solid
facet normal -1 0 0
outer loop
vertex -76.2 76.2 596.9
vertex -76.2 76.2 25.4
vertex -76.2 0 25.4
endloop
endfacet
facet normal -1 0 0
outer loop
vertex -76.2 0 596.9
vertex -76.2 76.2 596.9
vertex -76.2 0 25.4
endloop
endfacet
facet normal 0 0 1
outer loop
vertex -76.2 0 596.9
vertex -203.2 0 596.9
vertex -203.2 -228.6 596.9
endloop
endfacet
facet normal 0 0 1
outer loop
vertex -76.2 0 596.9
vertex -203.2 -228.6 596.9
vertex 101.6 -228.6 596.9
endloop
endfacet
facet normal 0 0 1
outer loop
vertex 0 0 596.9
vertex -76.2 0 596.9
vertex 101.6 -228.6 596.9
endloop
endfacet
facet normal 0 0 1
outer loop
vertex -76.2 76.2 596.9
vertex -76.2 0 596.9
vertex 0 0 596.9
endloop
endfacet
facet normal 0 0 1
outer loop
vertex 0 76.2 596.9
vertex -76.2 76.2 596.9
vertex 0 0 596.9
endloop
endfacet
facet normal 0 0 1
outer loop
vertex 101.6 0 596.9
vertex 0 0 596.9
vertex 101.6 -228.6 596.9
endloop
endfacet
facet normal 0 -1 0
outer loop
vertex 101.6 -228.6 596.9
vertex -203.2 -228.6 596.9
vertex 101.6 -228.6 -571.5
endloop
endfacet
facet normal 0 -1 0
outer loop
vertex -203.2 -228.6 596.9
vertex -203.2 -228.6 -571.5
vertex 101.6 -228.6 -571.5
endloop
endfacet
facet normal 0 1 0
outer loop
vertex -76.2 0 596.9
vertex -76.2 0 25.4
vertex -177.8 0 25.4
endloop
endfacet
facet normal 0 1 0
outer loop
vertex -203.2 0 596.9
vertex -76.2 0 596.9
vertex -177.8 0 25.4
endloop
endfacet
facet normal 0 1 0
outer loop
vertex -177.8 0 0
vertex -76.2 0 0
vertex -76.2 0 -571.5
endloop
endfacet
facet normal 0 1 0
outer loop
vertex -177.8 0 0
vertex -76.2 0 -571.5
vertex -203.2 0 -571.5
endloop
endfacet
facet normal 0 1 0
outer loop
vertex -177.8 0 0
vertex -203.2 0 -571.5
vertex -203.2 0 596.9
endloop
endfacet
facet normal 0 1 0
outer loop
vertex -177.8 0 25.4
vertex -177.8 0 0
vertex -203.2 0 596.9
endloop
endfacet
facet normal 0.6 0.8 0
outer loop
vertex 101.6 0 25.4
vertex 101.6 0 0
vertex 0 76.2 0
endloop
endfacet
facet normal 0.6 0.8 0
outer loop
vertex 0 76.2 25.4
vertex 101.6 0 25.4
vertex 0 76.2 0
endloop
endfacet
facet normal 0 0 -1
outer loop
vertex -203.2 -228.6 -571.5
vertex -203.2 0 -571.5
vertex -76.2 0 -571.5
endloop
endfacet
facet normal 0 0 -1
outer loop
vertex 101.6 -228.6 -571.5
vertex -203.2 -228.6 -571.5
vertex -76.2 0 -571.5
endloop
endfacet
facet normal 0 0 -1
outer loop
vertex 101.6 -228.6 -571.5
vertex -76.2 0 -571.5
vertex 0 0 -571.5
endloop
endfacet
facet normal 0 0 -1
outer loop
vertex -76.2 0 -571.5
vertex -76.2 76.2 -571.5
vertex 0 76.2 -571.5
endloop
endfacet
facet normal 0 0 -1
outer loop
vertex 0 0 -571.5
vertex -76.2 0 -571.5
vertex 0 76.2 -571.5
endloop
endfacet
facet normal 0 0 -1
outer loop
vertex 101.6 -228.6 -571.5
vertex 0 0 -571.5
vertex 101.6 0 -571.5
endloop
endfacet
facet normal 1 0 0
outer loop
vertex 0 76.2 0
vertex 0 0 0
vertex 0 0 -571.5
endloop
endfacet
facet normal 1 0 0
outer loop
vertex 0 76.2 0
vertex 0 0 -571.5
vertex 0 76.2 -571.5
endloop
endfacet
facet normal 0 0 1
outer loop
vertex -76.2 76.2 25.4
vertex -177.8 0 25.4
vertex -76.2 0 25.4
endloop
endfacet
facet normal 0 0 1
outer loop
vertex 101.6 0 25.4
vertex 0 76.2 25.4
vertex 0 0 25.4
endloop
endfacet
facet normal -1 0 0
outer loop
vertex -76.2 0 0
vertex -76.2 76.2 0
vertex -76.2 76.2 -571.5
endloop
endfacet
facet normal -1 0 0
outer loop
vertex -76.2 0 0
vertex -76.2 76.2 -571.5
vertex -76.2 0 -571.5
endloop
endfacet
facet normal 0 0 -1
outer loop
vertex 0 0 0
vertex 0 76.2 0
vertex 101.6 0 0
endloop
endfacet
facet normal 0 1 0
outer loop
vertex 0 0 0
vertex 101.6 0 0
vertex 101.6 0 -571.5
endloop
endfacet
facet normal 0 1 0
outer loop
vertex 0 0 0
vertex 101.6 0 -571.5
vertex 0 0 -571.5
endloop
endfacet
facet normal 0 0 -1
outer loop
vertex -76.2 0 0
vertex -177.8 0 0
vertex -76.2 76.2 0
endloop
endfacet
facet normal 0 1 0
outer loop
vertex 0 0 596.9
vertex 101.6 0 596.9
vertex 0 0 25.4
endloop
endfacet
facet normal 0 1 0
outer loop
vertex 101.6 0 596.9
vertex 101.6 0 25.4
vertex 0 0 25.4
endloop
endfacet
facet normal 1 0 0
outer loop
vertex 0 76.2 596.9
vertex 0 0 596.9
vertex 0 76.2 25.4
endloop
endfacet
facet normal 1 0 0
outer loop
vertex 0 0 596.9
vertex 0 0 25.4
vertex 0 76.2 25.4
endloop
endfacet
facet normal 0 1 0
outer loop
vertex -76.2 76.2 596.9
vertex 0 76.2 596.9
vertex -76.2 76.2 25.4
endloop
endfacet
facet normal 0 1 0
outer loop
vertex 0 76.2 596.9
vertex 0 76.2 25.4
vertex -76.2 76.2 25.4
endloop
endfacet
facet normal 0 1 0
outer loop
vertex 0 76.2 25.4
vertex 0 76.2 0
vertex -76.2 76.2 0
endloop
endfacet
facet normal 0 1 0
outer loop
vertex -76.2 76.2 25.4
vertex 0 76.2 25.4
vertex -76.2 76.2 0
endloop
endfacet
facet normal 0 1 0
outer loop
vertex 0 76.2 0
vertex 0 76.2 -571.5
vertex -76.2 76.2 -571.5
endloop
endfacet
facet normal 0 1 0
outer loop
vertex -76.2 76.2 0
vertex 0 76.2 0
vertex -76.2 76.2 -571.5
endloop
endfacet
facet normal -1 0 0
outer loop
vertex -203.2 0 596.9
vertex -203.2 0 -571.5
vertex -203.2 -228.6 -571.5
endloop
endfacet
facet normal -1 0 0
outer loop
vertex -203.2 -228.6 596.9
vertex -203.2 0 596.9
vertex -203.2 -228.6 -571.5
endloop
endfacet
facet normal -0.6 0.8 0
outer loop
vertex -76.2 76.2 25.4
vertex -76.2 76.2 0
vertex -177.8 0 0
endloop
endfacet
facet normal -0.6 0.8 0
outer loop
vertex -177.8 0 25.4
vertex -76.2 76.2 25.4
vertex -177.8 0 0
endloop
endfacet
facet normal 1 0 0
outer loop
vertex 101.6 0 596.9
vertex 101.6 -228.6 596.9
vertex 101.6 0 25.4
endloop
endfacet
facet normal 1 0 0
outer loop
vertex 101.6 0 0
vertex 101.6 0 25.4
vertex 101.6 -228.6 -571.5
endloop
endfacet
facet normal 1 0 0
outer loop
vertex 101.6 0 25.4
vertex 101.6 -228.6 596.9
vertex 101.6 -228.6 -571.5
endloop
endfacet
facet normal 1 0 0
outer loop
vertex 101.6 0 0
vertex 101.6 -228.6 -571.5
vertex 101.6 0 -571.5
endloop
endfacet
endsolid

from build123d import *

# Parameters (mm, degrees)
F1_DEPTH = 571.5
F2_DEPTH = 25.4
F3_DEPTH = 571.5
F4_DEPTH = 25.4


with BuildPart() as f1:
    # F0 (on Top) → F1 (new body, symmetric)
    with BuildSketch(Plane.XY):
        Polygon((-50.8, 0), (0, 0), (0, 76.2), (-76.2, 76.2), (-76.2, 0), align=None)
    extrude(amount=F1_DEPTH, both=True)

    # F0 (on Top) → F2 (join)
    with BuildSketch(Plane.XY):
        Polygon((-177.8, 0), (-76.2, 0), (-76.2, 76.2), align=None)
        Polygon((0, 76.2), (0, 0), (101.6, 0), align=None)
    extrude(amount=F2_DEPTH)

    # F0 (on Top) → F3 (join, symmetric)
    with BuildSketch(Plane.XY):
        Polygon((-76.2, -228.6), (-76.2, 0), (-177.8, 0), (-203.2, 0), (-203.2, -228.6), align=None)
        Polygon((101.6, 0), (0, 0), (-50.8, 0), (-76.2, 0), (-76.2, -228.6), (101.6, -228.6), align=None)
    extrude(amount=F3_DEPTH, both=True)

    # F3_face (on face) → F4 (join)
    with BuildSketch(Plane(origin=(-49.823077, -102.576923, 571.5), x_dir=(1, 0, 0), z_dir=(0, 0, 1))):
        Polygon((-153.376923, 102.576923), (-153.376923, -126.023077), (151.423077, -126.023077), (151.423077, 102.576923), (49.823077, 102.576923), (49.823077, 178.776923), (-26.376923, 178.776923), (-26.376923, 102.576923), align=None)
    extrude(amount=F4_DEPTH)


solid = f1.part
